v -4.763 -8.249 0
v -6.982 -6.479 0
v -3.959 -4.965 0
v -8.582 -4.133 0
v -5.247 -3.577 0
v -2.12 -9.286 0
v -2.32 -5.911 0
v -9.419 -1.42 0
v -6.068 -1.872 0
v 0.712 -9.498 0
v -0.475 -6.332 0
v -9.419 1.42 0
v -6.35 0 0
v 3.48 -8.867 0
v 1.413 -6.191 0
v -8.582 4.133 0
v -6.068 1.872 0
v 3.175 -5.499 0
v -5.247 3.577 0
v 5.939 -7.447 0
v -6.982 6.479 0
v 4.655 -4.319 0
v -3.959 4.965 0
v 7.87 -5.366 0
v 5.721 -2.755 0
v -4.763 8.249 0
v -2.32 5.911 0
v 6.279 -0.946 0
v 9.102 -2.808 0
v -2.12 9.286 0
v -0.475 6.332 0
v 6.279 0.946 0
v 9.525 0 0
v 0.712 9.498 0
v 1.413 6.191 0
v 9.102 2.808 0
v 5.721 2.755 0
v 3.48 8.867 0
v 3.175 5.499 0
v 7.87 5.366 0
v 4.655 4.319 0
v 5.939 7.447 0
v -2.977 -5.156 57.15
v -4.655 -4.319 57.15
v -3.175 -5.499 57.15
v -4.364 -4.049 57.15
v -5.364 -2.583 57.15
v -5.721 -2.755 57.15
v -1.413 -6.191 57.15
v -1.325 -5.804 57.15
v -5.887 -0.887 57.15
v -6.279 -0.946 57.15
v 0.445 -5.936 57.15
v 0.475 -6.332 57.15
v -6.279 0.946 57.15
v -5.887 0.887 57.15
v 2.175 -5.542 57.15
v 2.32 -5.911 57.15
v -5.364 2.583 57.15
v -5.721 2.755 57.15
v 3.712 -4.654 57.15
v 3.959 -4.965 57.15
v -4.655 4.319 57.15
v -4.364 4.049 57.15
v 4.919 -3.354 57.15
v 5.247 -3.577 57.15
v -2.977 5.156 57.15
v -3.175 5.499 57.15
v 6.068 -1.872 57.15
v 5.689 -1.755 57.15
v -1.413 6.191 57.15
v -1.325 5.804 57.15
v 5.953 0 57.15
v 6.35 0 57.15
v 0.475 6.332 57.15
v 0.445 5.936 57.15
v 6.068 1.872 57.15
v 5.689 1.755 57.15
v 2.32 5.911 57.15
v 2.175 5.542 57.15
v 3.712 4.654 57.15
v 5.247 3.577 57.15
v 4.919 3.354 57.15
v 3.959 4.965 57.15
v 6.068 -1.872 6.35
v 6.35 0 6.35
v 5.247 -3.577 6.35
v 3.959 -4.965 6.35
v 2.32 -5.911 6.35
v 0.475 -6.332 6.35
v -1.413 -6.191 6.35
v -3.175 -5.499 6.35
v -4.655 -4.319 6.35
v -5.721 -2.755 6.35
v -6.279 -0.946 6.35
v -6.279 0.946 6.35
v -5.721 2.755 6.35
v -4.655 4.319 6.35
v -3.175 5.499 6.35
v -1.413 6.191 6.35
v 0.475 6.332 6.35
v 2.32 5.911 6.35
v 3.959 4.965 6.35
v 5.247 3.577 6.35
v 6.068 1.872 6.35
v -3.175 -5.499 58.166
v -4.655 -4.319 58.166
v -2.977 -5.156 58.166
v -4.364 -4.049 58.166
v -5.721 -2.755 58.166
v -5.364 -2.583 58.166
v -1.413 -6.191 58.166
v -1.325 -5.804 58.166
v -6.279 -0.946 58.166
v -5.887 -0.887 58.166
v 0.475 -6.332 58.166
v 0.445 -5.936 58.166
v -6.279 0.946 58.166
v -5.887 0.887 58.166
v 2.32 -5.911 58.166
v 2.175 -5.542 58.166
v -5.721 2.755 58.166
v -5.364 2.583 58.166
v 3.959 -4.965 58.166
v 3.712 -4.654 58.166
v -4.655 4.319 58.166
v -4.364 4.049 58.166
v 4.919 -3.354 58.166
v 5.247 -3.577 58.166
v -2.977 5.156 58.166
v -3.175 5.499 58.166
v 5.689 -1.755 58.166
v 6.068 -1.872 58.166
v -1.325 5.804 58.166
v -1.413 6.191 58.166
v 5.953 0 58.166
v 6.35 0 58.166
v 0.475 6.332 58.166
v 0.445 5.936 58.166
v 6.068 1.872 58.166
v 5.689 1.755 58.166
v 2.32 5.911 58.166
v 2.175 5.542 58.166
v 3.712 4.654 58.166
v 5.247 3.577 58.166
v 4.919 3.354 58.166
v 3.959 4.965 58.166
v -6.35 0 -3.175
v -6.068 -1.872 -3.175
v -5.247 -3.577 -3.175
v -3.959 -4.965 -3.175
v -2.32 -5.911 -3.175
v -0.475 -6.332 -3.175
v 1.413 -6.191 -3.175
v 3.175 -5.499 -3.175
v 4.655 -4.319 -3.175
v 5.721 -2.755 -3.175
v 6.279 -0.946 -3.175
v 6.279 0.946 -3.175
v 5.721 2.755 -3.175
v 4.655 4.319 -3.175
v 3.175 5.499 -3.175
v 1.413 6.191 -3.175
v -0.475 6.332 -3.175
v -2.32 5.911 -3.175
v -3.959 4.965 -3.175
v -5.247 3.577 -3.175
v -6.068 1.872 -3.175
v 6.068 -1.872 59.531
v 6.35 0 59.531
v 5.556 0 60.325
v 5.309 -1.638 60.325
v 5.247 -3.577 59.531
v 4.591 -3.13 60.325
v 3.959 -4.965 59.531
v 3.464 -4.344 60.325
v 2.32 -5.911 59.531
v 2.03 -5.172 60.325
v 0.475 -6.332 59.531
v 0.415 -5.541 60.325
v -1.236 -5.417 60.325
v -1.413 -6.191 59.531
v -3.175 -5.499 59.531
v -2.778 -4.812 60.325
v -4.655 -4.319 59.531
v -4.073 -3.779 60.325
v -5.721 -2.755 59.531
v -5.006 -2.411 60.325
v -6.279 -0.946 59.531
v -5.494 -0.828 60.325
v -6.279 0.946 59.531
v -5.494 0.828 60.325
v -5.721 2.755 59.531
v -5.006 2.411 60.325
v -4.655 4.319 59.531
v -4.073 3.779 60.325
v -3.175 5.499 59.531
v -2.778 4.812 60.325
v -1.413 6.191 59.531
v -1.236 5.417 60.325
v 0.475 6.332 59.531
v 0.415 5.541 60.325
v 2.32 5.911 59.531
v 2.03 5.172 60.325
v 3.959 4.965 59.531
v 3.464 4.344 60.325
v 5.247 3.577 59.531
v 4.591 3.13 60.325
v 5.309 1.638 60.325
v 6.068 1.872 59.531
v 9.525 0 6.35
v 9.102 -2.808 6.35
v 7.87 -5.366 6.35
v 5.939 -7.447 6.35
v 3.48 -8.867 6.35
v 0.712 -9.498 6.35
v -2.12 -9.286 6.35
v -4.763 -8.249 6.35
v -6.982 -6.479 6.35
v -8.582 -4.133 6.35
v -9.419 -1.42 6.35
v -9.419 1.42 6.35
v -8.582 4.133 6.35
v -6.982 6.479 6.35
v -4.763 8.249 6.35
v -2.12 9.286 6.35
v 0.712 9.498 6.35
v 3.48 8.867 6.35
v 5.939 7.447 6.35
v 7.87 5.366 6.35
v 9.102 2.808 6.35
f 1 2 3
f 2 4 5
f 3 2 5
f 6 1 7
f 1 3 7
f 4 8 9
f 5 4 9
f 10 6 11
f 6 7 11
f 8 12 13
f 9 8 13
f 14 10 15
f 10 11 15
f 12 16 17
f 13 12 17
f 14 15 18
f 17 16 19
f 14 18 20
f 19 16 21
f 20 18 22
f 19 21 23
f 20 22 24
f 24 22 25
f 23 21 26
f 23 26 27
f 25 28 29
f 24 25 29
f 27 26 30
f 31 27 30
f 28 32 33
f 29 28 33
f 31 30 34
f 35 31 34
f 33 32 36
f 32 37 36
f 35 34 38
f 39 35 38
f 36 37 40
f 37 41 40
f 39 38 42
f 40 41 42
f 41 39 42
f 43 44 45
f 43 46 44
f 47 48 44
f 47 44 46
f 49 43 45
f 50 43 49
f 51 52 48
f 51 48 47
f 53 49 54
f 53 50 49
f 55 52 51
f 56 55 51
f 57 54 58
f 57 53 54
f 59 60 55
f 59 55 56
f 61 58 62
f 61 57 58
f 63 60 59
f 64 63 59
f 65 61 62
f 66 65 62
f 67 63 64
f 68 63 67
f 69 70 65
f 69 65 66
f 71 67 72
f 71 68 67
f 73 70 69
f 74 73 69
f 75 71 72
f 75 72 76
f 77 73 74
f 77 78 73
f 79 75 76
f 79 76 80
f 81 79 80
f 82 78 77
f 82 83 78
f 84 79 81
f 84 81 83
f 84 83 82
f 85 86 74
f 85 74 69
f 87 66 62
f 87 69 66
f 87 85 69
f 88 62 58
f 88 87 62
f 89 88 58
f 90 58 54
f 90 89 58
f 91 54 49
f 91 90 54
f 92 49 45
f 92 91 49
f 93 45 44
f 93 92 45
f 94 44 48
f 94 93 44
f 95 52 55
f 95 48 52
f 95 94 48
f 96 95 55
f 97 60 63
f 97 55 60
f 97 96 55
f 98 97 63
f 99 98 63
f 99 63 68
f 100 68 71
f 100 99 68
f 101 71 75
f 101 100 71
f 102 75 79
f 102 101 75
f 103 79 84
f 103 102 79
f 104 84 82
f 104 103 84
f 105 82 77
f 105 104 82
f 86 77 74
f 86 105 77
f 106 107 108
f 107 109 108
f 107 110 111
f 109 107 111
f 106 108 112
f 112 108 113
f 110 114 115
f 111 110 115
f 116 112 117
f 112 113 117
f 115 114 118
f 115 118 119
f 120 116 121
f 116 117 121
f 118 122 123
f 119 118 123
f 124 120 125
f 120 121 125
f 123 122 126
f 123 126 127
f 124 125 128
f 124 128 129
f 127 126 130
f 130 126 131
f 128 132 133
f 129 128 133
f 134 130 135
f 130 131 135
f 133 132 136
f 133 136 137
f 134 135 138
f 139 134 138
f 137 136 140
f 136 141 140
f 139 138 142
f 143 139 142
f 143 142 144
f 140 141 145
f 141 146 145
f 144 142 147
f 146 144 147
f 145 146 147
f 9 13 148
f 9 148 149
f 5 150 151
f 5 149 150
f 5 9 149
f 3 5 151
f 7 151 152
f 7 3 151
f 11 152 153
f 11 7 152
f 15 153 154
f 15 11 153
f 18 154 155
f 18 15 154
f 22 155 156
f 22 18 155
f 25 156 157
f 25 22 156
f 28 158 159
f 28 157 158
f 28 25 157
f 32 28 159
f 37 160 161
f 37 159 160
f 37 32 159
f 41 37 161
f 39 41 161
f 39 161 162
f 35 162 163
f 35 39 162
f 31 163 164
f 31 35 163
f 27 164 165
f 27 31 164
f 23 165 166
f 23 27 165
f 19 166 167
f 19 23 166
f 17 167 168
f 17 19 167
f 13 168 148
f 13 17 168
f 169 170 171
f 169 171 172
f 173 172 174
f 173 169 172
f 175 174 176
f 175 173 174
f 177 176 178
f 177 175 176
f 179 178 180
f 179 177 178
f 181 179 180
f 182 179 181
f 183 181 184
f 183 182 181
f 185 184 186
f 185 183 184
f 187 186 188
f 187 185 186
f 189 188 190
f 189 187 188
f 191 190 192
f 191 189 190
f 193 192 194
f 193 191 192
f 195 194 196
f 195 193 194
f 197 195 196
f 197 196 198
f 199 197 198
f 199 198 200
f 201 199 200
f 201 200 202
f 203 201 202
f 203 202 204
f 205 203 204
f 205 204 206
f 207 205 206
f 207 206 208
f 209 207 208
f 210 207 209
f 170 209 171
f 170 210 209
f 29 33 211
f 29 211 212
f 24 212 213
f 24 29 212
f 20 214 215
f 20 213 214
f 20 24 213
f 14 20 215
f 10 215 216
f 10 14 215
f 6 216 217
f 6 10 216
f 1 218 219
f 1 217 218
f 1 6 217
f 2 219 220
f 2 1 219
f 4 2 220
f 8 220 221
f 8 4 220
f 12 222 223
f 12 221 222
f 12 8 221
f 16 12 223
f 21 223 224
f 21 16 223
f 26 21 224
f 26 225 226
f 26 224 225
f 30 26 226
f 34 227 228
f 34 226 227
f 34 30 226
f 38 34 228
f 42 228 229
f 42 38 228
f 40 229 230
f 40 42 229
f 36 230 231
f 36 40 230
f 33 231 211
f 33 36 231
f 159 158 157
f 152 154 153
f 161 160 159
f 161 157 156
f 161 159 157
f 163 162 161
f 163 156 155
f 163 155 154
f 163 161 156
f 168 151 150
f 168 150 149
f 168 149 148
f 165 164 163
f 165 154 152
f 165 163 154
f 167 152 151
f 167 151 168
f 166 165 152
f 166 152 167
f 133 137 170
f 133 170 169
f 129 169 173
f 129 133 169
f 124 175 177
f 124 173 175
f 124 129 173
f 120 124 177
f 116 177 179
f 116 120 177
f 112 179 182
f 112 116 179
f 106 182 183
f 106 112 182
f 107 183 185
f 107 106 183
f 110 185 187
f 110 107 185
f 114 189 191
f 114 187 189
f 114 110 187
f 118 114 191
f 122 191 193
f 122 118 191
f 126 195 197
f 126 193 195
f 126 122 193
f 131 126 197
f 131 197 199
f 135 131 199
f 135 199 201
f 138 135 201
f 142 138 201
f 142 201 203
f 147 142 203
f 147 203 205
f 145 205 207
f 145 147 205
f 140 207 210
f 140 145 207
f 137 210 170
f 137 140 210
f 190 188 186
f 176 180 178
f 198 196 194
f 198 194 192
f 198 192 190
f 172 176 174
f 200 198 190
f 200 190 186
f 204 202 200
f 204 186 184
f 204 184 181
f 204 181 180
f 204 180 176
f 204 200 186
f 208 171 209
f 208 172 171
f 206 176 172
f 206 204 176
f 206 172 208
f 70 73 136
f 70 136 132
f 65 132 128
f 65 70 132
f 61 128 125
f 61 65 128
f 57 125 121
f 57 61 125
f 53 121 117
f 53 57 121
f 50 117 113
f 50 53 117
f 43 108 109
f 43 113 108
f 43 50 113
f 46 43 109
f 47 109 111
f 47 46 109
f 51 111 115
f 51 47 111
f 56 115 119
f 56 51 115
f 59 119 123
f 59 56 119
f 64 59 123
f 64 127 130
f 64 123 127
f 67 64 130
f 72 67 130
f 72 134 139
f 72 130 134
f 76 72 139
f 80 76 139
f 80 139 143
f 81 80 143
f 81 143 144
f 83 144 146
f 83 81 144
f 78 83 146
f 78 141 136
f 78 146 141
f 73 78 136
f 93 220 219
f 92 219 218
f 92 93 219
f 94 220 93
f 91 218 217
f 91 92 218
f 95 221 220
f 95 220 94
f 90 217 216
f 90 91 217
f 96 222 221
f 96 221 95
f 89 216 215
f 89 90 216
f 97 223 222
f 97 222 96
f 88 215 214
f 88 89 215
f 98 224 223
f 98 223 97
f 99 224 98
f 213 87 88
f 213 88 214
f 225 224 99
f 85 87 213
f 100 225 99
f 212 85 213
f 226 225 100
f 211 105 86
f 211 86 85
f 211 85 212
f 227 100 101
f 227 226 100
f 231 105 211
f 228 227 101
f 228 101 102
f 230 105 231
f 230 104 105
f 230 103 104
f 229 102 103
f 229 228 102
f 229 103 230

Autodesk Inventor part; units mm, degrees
ref_plane "YZ Plane" through (0, 0, 0) normal (1, 0, 0) x (0, 1, 0)
ref_plane "XZ Plane" through (0, 0, 0) normal (0, 1, 0) x (-1, 0, 0)
ref_plane "XY Plane" through (0, 0, 0) normal (0, 0, 1) x (1, 0, 0)
sketch "Sketch1" plane through (0, 0, 0) normal (0, 0, 1) x (1, 0, 0)
  circle A0 centre (0, 0) radius 9.525
  dimension "d0" = 19.05
extrude "Extrusion1" add sketch "Sketch1" along normal blind 6.35
sketch "Sketch2" plane through (0, 0, 6.35) normal (0, 0, 1) x (1, 0, 0)
  circle A0 centre (0, 0) radius 6.35
  dimension "d3" = 12.7
extrude "Extrusion2" add sketch "Sketch2" along normal blind 50.8
sketch "Sketch3" plane through (0, 0, 57.15) normal (0, 0, 1) x (1, 0, 0)
  circle A0 centre (0, 0) radius 5.9531
  dimension "d6" = 11.9062
extrude "Extrusion3" add sketch "Sketch3" along normal blind 1.016
sketch "Sketch4" plane through (0, 0, 58.166) normal (0, 0, 1) x (1, 0, 0)
  circle A0 centre (0, 0) radius 6.35 projected
extrude "Extrusion4" add sketch "Sketch4" along normal blind 2.159
chamfer "Chamfer1" distance 0.7937 angle 45 1 edges at (-6.35, 0, 60.325)
sketch "Sketch5" plane through (0, 0, 0) normal (0, 0, -1) x (-1, 0, 0)
  circle A0 centre (0, 0) radius 6.35
  dimension "d14" = 12.7
extrude "Extrusion5" add sketch "Sketch5" along normal blind 3.175
properties part number "A1-18002-100-38 Leg hinge pin" material "Steel, Mild"
